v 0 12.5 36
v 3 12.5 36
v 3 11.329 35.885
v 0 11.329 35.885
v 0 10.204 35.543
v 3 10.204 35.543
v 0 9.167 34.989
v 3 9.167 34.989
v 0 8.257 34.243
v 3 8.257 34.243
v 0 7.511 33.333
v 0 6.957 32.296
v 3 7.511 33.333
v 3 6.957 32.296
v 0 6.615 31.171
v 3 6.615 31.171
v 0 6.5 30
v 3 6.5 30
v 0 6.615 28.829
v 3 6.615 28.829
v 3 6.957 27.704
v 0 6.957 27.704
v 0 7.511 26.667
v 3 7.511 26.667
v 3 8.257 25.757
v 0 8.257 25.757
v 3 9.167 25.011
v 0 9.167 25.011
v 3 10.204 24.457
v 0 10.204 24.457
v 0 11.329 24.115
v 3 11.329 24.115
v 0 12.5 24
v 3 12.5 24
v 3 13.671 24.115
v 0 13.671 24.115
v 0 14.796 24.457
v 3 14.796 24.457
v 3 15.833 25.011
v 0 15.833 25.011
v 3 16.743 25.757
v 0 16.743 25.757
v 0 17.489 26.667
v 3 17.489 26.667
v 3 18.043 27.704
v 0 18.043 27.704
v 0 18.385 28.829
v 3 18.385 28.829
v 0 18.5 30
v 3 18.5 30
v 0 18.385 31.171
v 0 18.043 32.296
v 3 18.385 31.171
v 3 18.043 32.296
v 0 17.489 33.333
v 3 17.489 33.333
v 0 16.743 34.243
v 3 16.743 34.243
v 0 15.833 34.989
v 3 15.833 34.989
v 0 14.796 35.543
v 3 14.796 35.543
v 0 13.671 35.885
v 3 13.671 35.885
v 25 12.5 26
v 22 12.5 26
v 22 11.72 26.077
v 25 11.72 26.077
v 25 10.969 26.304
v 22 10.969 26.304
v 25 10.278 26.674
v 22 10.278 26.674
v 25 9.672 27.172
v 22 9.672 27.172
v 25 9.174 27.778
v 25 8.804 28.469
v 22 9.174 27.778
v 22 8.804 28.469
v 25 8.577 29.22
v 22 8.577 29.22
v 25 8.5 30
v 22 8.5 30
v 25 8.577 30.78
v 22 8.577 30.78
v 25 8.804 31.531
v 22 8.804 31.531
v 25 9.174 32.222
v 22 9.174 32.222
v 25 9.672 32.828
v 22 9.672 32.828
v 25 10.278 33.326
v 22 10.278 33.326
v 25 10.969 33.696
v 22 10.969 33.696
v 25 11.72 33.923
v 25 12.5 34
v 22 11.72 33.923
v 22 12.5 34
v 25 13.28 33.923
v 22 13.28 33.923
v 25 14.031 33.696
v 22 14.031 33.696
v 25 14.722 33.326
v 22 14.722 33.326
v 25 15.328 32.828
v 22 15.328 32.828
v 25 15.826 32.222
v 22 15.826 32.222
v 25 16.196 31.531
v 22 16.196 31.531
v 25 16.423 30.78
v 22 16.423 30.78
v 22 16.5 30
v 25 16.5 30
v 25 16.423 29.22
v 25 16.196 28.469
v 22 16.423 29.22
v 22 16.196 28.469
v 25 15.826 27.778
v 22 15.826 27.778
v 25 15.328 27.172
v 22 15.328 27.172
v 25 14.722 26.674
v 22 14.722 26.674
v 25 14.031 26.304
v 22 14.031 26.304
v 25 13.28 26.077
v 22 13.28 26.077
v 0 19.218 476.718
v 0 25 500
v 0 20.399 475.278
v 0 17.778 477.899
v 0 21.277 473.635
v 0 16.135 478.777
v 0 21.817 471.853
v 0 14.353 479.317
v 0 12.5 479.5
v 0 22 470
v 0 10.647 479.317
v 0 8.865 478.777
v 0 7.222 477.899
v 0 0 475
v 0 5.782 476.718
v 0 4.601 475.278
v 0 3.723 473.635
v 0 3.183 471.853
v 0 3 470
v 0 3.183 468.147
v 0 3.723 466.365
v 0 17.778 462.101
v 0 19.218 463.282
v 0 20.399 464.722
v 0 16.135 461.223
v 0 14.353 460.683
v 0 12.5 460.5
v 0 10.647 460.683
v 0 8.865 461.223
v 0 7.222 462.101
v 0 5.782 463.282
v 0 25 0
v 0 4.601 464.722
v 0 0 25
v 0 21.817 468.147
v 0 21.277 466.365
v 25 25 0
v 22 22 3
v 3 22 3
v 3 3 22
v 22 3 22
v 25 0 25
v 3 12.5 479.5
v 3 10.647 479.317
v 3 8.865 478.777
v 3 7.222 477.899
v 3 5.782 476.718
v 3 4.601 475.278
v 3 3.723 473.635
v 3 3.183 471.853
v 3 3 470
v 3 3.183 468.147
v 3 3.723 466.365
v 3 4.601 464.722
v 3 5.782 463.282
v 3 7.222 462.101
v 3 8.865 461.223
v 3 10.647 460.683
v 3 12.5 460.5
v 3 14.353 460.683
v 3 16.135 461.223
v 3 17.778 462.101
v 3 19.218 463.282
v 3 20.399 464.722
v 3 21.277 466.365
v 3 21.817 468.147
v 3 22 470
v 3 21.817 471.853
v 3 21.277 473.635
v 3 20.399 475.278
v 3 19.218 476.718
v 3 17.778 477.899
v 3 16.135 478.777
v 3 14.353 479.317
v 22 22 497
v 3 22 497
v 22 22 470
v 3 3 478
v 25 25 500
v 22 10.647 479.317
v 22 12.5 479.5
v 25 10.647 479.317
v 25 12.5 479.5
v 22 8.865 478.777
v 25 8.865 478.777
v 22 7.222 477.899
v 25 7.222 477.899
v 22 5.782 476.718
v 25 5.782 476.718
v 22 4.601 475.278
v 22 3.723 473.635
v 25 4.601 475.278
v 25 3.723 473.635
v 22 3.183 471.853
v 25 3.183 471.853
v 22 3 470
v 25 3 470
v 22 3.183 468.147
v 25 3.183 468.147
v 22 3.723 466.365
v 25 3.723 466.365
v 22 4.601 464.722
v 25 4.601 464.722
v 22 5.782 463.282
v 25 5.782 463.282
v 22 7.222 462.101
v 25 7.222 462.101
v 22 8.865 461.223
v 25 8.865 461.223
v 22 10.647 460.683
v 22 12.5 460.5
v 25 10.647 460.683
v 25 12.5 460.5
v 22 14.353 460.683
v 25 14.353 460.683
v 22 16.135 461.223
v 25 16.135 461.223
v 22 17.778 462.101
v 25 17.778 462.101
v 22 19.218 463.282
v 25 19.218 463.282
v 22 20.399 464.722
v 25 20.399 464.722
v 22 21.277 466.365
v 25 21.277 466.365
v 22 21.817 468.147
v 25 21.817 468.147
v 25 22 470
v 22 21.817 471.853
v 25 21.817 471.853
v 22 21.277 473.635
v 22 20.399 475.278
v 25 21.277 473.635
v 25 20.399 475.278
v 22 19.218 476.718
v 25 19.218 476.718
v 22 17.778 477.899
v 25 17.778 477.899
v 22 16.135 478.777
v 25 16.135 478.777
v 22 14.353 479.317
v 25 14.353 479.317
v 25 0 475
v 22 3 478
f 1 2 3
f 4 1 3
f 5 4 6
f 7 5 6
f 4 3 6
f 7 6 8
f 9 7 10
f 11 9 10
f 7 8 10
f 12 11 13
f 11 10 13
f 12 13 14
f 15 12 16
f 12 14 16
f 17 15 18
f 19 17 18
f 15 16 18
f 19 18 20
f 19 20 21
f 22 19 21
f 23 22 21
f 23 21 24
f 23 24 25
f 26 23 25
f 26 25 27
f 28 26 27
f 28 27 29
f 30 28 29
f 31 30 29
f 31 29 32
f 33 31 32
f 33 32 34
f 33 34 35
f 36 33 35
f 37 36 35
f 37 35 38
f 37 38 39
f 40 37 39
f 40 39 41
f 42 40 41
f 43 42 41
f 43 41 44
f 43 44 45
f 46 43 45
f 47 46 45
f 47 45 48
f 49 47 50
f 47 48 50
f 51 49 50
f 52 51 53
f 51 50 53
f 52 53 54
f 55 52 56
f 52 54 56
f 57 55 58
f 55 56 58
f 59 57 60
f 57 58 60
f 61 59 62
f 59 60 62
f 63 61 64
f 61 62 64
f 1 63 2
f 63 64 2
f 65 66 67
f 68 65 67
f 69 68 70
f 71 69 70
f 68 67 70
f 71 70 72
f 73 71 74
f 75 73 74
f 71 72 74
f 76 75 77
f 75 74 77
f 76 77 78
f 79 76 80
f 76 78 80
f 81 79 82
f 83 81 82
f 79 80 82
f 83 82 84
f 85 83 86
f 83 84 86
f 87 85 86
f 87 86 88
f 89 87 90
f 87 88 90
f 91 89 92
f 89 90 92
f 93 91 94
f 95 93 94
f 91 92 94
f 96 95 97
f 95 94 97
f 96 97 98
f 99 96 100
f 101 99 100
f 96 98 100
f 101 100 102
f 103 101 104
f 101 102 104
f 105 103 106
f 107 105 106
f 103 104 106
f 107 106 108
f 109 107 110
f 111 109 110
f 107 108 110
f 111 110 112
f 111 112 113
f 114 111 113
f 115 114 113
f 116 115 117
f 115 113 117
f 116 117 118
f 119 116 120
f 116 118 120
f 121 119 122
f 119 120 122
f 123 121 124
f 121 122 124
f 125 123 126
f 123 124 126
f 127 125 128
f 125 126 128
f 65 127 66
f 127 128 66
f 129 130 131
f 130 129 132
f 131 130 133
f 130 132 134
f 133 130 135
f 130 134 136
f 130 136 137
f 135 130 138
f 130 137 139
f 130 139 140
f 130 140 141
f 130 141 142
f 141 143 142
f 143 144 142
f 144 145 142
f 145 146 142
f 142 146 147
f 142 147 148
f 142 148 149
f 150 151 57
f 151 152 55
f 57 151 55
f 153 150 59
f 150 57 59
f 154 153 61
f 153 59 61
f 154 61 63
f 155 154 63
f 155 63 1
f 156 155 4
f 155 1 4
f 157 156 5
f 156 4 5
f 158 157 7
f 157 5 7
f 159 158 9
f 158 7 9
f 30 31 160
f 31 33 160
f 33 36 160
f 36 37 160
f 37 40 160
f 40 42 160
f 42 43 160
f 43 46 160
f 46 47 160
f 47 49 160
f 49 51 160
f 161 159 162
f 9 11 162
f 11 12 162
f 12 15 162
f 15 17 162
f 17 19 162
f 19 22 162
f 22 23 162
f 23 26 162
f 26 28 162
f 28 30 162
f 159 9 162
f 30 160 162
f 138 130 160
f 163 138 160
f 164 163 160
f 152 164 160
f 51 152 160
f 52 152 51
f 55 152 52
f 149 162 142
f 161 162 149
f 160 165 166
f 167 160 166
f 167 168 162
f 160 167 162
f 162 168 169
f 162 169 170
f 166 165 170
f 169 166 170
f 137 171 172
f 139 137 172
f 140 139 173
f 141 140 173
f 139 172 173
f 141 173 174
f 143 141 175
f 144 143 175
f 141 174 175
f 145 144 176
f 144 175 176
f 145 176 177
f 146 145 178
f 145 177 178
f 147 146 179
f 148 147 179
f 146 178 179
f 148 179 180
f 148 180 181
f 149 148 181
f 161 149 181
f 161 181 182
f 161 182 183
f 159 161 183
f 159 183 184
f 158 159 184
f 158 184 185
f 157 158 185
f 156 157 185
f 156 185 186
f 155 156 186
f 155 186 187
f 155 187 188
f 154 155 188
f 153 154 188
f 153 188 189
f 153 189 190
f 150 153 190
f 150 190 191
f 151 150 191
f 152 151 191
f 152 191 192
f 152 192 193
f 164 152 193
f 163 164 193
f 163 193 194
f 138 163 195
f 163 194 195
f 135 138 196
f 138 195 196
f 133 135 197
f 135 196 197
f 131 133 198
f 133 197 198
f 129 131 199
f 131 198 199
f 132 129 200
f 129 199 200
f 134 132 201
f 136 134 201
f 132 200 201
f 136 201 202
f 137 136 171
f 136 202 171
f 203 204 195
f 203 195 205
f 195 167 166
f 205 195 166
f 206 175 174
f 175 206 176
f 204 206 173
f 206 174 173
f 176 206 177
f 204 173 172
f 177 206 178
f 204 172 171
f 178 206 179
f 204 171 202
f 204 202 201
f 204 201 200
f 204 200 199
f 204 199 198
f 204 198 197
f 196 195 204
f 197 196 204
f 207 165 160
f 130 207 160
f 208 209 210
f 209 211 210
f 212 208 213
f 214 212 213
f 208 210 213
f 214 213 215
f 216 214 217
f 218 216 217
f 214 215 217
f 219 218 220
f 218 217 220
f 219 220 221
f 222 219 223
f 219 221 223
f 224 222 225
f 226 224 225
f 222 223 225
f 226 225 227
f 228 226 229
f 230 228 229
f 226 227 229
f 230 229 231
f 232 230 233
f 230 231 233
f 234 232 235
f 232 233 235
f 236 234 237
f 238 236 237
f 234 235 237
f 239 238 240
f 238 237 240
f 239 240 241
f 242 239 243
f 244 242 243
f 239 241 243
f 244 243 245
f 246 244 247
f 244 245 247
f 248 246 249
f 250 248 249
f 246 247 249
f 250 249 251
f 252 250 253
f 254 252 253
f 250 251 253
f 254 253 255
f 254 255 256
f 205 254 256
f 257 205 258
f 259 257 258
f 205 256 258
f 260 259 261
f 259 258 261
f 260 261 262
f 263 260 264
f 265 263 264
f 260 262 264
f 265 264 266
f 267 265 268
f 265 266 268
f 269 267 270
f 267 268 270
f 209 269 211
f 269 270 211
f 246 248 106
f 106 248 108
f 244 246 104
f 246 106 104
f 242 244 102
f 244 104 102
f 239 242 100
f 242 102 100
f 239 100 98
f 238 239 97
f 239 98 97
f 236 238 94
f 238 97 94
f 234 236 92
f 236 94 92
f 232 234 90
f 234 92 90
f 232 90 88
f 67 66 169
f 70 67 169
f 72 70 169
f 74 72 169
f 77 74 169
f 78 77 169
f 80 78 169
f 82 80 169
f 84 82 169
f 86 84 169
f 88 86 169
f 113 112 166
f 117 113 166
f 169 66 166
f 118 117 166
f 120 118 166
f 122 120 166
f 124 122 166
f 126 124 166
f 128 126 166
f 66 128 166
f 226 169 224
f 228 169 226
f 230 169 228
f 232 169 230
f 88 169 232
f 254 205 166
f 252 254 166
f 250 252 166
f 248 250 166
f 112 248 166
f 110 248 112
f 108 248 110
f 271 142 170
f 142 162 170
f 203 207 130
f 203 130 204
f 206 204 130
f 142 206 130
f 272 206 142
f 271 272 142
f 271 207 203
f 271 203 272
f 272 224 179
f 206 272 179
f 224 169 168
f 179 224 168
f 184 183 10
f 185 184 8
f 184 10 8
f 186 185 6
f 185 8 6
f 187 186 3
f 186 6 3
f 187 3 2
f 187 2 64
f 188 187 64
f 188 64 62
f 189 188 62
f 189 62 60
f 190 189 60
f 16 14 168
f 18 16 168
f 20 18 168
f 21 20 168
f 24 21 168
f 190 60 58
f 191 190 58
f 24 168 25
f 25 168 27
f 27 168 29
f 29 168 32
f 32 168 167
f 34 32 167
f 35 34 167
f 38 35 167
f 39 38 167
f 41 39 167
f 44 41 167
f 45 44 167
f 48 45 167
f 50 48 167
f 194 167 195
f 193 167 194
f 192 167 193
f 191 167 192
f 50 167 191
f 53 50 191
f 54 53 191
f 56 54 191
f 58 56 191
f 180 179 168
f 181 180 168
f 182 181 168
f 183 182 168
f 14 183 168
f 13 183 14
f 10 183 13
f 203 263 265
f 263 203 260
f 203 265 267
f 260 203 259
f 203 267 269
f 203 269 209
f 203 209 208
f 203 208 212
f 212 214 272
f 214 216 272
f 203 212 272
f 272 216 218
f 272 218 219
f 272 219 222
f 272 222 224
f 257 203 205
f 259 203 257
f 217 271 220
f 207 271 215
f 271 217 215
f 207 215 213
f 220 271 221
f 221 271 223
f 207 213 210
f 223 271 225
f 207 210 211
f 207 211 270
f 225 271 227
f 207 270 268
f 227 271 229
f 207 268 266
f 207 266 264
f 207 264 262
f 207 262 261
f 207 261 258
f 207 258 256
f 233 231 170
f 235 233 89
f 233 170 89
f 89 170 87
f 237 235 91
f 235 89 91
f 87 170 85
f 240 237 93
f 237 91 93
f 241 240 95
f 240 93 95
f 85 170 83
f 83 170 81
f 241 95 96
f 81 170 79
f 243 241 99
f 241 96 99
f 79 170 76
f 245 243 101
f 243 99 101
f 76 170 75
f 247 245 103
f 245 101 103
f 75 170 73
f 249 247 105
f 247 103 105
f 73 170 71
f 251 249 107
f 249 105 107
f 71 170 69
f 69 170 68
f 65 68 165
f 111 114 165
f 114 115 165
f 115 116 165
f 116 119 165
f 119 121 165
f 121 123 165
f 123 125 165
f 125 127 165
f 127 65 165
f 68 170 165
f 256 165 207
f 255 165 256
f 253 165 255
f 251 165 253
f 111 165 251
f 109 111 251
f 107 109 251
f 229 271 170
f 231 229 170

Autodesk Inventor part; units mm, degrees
ref_plane "YZ Plane" through (0, 0, 0) normal (1, 0, 0) x (0, 1, 0)
ref_plane "XZ Plane" through (0, 0, 0) normal (0, 1, 0) x (-1, 0, 0)
ref_plane "XY Plane" through (0, 0, 0) normal (0, 0, 1) x (1, 0, 0)
sketch "Sketch1" plane through (0, 0, 0) normal (0, 0, 1) x (1, 0, 0)
  line L0 (0, 0) -> (25, 0)
  line L1 (25, 0) -> (25, 25)
  line L2 (25, 25) -> (0, 25)
  line L3 (0, 25) -> (0, 0)
  line L4 (3, 22) -> (22, 22)
  line L5 (22, 22) -> (22, 3)
  line L6 (22, 3) -> (3, 3)
  line L7 (3, 3) -> (3, 22)
  dimension "d0" = 25
  dimension "d1" = 25
  dimension "d2" = 3
extrude "Extrusion1" add sketch "Sketch1" along normal blind 500
sketch "Sketch2" plane through (25, 0, 0) normal (1, 0, 0) x (0, 0, -1)
  line L0 (0, 0) -> (0, 25) projected
  line L1 (0, 25) -> (-500, 25) projected
  line L2 (-500, 0) -> (-500, 25) projected
  line L3 (0, 0) -> (-500, 0) projected
  line L4 (-500, 25) -> (-475, 0)
  line L5 (-500, 25) -> (-464.6447, 25) construction
  line L6 (0, 25) -> (-25, 0)
  line L7 (0, 25) -> (35.3553, 25) construction
  dimension "d5" = 45
  dimension "d6" = 135
extrude "Extrusion2" cut sketch "Sketch2" against normal blind 500 contours L3 L6 L0 | L4 L3 L2
sketch "Sketch3" plane through (25, 25, 500) normal (1, 0, 0) x (0, 0, -1)
  line L0 (475, -25) -> (25, -25) projected
  line L1 (500, 0) -> (0, 0) projected
  point P0 (500, -25)
  point P1 (30, -12.5)
  point P2 (470, -12.5)
  point P3 (250, 0)
  dimension "d9" = 440
  dimension "d10" = 12.5
  dimension "d11" = 220
hole "Hole1" at (25, 12.5, 30) direction (-1, 0, 0) diameter 8 depth 8 tip angle 118
sketch "Sketch5" plane through (0, 25, 0) normal (-1, 0, 0) x (0, 0, 1)
  circle A0 centre (30, -12.5) radius 4 projected
  point P0 (0, -25)
  point P1 (470, -12.5)
  dimension "d33" = 440
hole "Hole3" at (0, 12.5, 30) at (0, 12.5, 470) direction (1, 0, 0) diameter 12 depth 8 tip angle 118
sketch "Sketch6" plane through (0, 25, 0) normal (-1, 0, 0) x (0, 0, 1)
  circle A0 centre (470, -12.5) radius 6 projected
  point P0 (0, -25)
hole "Hole4" at (0, 12.5, 470) direction (1, 0, 0) diameter 19 end through all
equation "\"d11\" = 0.5 * d9"
properties part number "P501" material "Aluminum 6061"
